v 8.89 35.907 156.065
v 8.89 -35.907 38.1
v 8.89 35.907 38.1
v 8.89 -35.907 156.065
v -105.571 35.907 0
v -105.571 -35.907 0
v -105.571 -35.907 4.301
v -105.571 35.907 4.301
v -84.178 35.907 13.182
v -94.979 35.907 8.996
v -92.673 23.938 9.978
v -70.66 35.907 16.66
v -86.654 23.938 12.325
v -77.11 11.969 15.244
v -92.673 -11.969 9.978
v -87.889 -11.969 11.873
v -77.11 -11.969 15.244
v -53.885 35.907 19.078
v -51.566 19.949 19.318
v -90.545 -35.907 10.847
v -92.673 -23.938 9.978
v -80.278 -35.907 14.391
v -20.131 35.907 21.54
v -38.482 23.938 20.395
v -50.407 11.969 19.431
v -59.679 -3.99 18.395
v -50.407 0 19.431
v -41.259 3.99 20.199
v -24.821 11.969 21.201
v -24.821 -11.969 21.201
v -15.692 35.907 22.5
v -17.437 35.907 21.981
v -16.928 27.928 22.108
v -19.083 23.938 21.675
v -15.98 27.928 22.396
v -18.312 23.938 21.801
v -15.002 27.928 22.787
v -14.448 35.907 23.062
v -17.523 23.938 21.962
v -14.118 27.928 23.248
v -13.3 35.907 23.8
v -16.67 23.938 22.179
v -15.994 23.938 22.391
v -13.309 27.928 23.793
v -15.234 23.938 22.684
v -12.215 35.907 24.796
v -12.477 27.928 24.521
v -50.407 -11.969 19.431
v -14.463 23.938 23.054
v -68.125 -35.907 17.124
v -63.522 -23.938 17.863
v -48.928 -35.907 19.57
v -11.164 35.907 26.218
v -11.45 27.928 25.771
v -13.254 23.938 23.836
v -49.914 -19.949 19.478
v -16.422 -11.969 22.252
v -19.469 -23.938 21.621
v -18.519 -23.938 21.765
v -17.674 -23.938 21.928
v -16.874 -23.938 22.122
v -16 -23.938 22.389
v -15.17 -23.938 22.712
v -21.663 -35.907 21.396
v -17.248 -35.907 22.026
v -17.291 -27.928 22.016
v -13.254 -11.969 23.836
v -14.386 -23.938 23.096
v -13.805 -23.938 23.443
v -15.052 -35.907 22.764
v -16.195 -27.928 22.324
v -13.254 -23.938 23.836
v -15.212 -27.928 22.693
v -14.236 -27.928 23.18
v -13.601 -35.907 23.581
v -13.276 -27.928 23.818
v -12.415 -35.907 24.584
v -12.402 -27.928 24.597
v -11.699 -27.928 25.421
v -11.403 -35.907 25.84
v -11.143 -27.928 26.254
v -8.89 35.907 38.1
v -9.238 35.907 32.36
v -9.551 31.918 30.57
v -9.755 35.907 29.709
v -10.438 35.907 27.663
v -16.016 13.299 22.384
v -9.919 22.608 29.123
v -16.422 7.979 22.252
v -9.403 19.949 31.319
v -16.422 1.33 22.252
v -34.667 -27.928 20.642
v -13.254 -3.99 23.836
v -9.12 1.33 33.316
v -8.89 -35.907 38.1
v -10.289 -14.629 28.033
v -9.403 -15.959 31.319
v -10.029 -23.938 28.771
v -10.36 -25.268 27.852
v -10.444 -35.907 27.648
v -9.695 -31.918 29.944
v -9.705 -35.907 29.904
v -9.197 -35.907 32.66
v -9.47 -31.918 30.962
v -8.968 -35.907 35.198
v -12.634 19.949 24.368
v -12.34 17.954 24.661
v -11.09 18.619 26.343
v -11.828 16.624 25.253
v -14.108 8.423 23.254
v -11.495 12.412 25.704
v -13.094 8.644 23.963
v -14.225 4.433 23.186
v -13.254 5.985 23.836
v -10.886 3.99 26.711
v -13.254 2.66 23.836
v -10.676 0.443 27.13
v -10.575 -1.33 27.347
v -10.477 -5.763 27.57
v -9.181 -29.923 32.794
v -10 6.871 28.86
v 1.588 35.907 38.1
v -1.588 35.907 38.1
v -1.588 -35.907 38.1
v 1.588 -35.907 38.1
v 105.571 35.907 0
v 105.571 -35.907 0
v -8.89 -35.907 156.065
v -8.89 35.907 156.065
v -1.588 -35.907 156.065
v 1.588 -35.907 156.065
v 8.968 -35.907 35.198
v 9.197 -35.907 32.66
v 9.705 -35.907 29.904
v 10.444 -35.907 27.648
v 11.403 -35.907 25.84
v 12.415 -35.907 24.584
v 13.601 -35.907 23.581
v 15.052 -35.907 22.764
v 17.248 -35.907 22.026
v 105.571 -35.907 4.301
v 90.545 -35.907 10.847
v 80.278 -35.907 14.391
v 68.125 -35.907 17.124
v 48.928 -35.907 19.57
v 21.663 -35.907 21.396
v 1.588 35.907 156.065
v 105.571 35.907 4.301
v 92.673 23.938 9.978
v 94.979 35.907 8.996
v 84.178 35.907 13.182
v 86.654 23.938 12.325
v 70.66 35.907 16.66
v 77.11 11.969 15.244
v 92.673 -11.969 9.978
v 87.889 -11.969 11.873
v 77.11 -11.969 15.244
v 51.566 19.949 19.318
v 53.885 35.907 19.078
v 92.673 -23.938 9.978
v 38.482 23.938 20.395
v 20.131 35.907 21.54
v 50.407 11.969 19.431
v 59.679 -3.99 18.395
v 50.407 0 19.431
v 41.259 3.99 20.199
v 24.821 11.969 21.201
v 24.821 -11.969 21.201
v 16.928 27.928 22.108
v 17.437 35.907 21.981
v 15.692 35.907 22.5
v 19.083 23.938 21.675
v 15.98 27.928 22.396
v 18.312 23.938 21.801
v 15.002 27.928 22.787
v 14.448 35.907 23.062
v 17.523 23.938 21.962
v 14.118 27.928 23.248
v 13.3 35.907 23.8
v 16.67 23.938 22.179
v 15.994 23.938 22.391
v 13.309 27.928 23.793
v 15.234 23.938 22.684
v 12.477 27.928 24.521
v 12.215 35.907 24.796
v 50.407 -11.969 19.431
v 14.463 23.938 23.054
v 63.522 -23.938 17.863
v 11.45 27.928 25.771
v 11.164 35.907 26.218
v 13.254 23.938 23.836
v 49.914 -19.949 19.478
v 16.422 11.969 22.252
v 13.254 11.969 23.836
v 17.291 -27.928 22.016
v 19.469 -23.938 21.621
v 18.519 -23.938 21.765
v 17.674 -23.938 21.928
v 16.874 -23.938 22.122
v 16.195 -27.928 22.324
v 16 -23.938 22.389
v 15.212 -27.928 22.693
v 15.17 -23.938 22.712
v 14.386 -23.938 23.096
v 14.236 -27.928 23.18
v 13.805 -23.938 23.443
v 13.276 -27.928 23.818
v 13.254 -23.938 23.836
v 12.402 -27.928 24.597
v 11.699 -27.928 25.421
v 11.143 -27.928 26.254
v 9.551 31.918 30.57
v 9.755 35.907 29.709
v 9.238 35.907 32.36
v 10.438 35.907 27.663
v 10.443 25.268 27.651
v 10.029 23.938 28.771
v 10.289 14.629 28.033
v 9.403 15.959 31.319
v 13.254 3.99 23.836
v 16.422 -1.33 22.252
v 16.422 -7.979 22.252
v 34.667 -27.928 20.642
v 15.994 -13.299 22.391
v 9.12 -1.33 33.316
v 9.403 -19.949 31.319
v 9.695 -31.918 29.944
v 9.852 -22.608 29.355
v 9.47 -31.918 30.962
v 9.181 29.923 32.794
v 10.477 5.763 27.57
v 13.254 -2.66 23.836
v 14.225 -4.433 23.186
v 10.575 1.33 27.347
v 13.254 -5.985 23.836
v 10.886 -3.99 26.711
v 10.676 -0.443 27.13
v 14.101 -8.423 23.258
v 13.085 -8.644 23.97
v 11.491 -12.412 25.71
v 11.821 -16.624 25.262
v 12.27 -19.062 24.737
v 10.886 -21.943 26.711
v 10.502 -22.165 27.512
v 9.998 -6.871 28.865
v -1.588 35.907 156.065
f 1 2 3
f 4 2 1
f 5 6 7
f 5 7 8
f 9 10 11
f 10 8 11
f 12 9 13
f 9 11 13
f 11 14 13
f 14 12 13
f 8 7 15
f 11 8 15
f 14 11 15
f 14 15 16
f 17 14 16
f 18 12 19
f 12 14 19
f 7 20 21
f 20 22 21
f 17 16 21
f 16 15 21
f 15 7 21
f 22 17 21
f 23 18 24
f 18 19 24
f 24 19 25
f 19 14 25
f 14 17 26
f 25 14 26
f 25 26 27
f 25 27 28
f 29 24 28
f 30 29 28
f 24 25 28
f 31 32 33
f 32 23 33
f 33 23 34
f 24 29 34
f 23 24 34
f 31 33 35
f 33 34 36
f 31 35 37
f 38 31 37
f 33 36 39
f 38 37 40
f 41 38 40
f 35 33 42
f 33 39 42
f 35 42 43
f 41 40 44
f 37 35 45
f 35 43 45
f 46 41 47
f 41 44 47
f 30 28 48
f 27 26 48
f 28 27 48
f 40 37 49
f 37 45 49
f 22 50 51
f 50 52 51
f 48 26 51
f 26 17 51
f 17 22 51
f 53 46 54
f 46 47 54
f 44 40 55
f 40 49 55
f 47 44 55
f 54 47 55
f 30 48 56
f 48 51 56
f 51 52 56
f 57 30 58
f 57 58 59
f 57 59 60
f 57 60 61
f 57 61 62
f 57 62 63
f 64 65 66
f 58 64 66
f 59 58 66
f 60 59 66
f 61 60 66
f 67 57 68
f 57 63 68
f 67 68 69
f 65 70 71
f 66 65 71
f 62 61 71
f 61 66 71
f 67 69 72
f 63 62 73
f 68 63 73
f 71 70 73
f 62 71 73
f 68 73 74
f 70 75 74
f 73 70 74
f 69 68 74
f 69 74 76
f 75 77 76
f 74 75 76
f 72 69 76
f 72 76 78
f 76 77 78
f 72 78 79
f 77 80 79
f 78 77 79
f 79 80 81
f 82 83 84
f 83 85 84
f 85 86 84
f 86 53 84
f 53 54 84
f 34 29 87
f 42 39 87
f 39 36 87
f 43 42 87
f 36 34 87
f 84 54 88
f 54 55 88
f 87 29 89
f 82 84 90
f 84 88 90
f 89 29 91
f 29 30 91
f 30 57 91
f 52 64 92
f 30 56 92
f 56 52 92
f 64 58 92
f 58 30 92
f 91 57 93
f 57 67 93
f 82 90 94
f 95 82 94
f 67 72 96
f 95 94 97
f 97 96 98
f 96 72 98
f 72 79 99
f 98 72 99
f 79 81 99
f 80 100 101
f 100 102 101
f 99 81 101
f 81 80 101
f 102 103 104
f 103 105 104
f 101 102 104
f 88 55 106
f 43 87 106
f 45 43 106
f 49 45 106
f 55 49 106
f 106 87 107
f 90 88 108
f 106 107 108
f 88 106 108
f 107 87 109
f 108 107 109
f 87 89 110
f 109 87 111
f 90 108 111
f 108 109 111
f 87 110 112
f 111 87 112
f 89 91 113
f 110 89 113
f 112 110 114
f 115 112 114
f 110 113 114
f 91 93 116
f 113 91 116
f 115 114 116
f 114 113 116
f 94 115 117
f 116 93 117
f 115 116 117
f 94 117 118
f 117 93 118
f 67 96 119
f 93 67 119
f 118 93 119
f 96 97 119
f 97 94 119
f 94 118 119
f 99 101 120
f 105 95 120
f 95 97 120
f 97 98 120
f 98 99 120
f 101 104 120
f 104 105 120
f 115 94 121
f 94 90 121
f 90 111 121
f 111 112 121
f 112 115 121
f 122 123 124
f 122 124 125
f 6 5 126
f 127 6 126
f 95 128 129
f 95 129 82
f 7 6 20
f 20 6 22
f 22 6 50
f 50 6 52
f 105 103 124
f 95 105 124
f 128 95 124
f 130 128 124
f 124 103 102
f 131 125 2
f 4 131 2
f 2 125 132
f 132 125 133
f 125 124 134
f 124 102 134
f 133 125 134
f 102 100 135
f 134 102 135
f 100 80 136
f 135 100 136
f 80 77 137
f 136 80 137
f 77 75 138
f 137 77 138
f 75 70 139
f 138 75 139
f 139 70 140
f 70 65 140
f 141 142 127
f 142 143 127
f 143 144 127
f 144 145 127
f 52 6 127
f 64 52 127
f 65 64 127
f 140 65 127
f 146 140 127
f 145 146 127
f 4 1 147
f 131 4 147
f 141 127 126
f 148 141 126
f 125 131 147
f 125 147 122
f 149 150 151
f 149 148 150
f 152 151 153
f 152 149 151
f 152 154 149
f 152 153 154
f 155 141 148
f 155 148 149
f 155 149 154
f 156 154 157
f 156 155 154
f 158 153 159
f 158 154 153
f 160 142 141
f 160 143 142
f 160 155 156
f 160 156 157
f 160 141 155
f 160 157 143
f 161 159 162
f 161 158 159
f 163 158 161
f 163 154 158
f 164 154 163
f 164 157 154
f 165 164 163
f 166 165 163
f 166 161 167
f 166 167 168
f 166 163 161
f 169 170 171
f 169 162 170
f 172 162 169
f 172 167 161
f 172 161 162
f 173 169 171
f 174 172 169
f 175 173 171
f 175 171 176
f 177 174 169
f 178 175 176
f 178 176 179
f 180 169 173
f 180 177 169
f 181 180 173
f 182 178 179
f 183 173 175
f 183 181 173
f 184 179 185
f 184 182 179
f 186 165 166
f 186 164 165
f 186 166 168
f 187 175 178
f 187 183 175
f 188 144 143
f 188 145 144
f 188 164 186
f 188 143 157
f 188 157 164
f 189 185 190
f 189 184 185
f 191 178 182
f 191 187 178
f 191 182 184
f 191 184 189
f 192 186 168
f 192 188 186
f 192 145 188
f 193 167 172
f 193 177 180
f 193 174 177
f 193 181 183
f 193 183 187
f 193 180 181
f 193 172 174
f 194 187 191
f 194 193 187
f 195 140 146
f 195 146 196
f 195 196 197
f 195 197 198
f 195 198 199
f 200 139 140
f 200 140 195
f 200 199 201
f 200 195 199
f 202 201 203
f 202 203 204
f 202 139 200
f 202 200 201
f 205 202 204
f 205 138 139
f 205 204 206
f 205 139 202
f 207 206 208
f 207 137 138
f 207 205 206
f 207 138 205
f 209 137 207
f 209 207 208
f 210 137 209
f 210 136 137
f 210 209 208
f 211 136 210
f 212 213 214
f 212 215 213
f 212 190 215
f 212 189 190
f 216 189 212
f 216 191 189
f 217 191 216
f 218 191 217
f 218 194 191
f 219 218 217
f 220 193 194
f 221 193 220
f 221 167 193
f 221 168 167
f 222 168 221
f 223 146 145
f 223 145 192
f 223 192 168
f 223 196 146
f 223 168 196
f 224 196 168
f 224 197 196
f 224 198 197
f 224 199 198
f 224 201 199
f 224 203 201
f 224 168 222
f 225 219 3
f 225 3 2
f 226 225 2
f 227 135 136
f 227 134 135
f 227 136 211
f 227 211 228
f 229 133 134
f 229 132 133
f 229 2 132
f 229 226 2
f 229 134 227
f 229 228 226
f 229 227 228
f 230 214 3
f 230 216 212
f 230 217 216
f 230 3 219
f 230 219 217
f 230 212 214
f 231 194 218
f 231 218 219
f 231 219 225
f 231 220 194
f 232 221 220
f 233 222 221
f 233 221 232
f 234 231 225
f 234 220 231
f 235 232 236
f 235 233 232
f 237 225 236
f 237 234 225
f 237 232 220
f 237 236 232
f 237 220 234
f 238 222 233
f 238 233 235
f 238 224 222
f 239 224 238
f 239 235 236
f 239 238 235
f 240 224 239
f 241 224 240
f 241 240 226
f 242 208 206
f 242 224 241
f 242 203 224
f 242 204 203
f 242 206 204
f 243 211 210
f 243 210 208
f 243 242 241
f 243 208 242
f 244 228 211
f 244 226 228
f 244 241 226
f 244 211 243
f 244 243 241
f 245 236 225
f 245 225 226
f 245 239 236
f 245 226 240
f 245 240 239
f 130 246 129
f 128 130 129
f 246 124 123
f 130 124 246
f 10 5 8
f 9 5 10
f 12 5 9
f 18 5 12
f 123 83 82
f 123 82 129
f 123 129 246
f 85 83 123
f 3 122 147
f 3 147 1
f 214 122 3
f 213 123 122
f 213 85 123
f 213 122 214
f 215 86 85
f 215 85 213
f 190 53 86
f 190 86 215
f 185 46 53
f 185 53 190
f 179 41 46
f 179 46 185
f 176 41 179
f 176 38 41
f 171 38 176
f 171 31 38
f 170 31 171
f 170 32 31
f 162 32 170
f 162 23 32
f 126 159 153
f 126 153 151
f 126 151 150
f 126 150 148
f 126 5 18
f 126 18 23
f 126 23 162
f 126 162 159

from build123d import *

# Parameters (mm, degrees)
F0_W     = 211.1423015594
F0_H     = 71.8148499727
F1_DEPTH = 38.1
F4_DEPTH = 71.8148499727
F6_DEPTH = 90.678


with BuildPart() as f1:
    # F0 (on Top) → F1 (new body)
    with BuildSketch(Plane.XY):
        Rectangle(F0_W, F0_H)
    extrude(amount=F1_DEPTH)

    # F3 (on face) → F4 (join, through all)
    with BuildSketch(Plane.XZ.offset(35.9074249864)):
        Polygon((-8.89, 19.05), (8.89, 19.05), (8.89, 156.0654991746), (1.5875, 156.0654991746), (1.5875, 25.9591713548), (-1.5875, 25.9591713548), (-1.5875, 156.0654991746), (-8.89, 156.0654991746), align=None)
    extrude(amount=-F4_DEPTH)

    # F5 (on face) → F6 (cut)
    with BuildSketch(Plane.XZ.offset(35.9074249864)):
        with BuildLine():
            Line((-107.0431917906, 43.3599539101), (-107.0431917906, 3.6818189494))
            add(Edge.make_bspline(
                [(-107.0431917906, 3.6818189494), (-98.3908130965, 7.2554203267), (-78.2537077612, 18.3396192593), (-24.7400000825, 21.1928359311), (-8.89, 22.0728348941), (-8.89, 38.1)],
                knots=[0, 0, 0, 0, 0.3193478157, 0.7283198865, 1, 1, 1, 1], degree=3))
            Line((-8.89, 38.1), (-107.0431917906, 43.3599539101))
        make_face()
        with BuildLine():
            add(Edge.make_bspline(
                [(107.0431917906, 3.6818189494), (98.3908130965, 7.2554203267), (78.2537077612, 18.3396192593), (24.7400000825, 21.1928359311), (8.89, 22.0728348941), (8.89, 38.1)],
                knots=[0, 0, 0, 0, 0.3193478157, 0.7283198865, 1, 1, 1, 1], degree=3))
            Line((107.0431917906, 3.6818189494), (107.0431917906, 43.3599539101))
            Line((107.0431917906, 43.3599539101), (8.89, 38.1))
        make_face()
    extrude(amount=-F6_DEPTH, mode=Mode.SUBTRACT)


solid = f1.part
